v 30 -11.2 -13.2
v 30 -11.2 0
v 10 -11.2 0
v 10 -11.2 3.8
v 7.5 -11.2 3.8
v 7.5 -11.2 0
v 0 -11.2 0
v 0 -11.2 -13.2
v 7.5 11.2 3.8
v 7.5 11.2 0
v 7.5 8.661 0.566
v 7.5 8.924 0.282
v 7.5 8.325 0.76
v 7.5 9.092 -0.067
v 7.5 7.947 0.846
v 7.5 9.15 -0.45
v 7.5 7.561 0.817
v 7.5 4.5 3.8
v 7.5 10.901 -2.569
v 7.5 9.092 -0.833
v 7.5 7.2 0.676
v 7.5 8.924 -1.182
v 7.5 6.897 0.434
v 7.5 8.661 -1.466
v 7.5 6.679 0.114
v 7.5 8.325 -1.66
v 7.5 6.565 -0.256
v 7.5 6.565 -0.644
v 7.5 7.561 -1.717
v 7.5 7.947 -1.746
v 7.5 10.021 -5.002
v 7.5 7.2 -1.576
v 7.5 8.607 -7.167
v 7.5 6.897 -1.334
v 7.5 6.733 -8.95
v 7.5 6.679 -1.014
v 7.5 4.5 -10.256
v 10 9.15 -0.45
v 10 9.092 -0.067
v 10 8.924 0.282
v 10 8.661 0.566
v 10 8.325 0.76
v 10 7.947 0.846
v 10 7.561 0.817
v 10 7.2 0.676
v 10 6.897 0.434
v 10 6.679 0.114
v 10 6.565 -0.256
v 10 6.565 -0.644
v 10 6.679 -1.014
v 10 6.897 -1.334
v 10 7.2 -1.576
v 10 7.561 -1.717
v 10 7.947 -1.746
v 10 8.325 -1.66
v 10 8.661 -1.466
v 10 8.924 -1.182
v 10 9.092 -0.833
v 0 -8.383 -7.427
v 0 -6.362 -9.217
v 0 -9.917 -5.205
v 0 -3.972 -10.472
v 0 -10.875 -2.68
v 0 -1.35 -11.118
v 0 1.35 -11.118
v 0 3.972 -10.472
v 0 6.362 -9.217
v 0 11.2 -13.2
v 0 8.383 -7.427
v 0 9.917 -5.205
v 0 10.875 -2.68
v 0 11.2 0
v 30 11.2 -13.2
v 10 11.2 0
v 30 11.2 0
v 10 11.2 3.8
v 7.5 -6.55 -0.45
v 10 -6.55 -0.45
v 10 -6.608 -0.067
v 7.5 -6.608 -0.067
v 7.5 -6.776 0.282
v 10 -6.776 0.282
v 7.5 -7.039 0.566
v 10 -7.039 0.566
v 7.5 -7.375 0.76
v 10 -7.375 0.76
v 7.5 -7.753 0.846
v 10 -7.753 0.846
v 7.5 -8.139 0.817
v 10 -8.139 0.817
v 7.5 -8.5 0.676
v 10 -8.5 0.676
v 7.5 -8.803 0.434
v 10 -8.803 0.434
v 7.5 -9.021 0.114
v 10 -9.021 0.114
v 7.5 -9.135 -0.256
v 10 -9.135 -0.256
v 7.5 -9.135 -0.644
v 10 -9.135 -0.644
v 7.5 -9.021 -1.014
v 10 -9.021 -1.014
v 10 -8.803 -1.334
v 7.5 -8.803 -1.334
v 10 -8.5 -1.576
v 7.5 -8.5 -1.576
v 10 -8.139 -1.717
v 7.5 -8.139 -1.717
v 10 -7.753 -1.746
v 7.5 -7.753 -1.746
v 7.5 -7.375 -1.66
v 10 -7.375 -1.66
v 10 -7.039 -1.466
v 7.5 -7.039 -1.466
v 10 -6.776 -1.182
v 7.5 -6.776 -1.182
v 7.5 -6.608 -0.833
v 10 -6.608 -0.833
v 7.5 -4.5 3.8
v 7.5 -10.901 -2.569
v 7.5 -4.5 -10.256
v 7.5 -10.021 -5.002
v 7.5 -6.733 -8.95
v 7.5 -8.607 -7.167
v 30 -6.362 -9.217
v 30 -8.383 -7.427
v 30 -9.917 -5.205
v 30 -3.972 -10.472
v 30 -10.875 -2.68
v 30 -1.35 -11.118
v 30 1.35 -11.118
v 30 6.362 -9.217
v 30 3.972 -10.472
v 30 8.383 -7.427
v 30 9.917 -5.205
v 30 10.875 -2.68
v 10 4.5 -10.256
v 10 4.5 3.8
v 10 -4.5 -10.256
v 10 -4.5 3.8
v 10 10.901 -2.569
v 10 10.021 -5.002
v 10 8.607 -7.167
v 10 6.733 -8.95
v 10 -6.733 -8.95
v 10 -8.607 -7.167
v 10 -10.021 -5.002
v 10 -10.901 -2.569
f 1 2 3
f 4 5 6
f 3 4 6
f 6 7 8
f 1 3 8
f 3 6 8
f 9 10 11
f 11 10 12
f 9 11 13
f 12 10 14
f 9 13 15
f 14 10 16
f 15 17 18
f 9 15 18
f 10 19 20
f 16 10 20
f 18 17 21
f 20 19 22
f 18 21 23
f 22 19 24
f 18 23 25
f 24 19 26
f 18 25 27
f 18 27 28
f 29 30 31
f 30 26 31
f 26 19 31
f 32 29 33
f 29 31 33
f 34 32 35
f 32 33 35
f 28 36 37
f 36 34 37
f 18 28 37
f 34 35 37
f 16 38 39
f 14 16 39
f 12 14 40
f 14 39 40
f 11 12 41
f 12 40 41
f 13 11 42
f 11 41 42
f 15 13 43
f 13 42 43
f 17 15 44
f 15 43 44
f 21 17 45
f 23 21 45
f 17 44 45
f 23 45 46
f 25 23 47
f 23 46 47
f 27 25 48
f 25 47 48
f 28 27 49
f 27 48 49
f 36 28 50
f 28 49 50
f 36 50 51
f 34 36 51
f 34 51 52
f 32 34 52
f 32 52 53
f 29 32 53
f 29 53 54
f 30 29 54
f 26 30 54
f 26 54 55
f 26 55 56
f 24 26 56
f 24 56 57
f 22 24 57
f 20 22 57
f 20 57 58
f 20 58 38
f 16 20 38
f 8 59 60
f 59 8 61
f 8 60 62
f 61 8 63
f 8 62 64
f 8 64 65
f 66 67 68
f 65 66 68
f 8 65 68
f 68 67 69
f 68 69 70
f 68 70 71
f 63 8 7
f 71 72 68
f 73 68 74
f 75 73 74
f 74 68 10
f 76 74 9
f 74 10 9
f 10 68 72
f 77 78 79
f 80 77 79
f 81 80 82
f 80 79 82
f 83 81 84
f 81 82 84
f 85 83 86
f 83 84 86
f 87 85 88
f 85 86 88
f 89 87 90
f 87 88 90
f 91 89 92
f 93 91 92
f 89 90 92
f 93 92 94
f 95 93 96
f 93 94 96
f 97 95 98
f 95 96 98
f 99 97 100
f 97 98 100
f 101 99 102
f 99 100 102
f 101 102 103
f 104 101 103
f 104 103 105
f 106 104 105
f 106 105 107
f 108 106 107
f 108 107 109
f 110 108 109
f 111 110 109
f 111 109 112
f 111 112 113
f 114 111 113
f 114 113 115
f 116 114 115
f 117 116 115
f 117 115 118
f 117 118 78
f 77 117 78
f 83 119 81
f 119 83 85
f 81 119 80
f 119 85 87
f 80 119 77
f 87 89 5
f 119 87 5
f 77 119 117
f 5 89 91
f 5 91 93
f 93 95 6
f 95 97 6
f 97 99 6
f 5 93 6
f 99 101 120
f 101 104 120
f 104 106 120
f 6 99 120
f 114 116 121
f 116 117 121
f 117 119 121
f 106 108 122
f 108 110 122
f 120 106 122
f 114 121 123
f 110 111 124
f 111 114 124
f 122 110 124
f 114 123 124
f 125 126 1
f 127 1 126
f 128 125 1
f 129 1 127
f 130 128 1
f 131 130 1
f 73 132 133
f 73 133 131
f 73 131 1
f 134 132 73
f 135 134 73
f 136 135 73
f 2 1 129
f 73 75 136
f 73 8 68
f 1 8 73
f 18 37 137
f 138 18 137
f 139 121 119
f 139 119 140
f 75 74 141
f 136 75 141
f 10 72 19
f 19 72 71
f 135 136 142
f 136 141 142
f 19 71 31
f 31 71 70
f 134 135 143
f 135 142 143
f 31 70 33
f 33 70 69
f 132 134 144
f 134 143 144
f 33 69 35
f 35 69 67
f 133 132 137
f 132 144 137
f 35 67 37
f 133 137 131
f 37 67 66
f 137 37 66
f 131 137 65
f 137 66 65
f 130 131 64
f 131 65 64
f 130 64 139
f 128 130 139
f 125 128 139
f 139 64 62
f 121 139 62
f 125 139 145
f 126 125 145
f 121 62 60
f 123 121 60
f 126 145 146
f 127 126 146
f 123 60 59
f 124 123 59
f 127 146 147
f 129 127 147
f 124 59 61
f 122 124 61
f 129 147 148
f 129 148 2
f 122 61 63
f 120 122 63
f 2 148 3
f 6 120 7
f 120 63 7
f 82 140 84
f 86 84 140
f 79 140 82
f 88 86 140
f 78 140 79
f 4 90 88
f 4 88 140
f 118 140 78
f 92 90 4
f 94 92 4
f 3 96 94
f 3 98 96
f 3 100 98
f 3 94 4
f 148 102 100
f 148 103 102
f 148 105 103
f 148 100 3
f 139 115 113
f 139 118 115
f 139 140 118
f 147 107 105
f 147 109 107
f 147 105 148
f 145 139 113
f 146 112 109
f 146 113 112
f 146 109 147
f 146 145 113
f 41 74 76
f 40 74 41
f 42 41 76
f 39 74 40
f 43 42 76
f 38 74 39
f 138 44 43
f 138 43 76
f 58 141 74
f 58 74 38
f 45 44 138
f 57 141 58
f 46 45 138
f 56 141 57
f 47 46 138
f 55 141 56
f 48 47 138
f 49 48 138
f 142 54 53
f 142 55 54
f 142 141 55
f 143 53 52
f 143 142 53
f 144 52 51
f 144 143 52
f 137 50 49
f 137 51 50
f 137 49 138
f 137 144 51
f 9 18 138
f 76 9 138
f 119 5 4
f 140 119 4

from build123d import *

# Parameters (mm, degrees)
F1_DEPTH = 30
F2_W     = 2.5
F2_H     = 6.7
F3_DEPTH = 17
F4_R     = 1.3
F5_DEPTH = 10.001


with BuildPart() as f1:
    # F0 (on Right) → F1 (new body)
    with BuildSketch(Plane.YZ):
        with BuildLine():
            Line((-11.2, 0), (-11.2, -13.2))
            Line((-11.2, -13.2), (11.2, -13.2))
            Line((11.2, -13.2), (11.2, 0))
            ThreePointArc((11.2, 0), (0, -11.2), (-11.2, 0))
        make_face()
    extrude(amount=F1_DEPTH)

    # F2 (on face) → F3 (join)
    with BuildSketch(Plane(origin=(0, 0, -13.2), x_dir=(1, 0, 0), z_dir=(0, 0, -1))):
        with Locations((8.75, 7.85)):
            Rectangle(F2_W, F2_H)
        with Locations((8.75, -7.85)):
            Rectangle(F2_W, F2_H)
    extrude(amount=-F3_DEPTH)

    # F4 (on face) → F5 (cut, through all)
    with BuildSketch(Plane.YZ.offset(10)):
        with Locations((-7.85, -0.45)):
            Circle(F4_R)
        with Locations((7.85, -0.45)):
            Circle(F4_R)
    extrude(amount=-F5_DEPTH, mode=Mode.SUBTRACT)


solid = f1.part
